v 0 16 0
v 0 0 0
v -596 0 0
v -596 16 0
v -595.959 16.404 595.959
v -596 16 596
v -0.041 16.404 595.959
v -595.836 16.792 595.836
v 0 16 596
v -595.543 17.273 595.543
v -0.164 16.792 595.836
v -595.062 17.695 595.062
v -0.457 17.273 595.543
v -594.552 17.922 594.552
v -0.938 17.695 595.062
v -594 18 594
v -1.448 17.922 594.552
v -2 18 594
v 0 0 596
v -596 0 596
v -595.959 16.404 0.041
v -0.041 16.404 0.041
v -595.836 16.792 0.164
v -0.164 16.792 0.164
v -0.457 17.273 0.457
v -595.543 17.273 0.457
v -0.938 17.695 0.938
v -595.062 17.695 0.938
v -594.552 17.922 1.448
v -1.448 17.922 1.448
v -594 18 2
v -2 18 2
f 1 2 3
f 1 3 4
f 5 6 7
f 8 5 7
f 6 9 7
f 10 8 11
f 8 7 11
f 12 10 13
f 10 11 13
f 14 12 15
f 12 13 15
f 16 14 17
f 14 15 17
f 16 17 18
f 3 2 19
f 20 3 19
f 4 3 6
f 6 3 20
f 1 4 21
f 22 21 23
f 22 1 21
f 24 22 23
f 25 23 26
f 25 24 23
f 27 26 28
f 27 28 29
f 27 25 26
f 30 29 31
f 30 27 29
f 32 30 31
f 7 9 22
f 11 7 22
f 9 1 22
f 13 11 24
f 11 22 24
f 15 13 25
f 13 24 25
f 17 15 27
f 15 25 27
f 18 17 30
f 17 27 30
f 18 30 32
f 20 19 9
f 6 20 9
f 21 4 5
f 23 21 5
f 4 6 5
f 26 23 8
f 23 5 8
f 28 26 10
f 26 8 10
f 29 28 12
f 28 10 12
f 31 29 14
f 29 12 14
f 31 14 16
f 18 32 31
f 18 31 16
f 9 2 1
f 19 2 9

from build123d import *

# Parameters (mm, degrees)
F0_W     = 60.9826296568
F0_H     = 42.9404079914
F1_DEPTH = 18
F2_DEPTH = 596
F3_DEPTH = 596
F4_R     = 2


with BuildPart() as f1:
    # F0 (on Front) → F1 (new body)
    with BuildSketch(Plane.XZ):
        with Locations((-30.4913148284, 21.4702039957)):
            Rectangle(F0_W, F0_H)
    extrude(amount=-F1_DEPTH)

    # F2 (add): a face of the model
    f2_faces = [f1.faces().sort_by_distance(p)[0] for p in [
        (0, 9, 21.4702039957),
    ]]
    extrude(f2_faces, amount=-F2_DEPTH)

    # F3 (add): a face of the model
    f3_faces = [f1.faces().sort_by_distance(p)[0] for p in [
        (-298, 9, 0),
    ]]
    extrude(f3_faces, amount=-F3_DEPTH)

    # F4
    f4_edges = [f1.edges().sort_by_distance(p)[0] for p in [
        (0, 18, 298),
        (-298, 18, 596),
        (-596, 18, 298),
        (-298, 18, 0),
    ]]
    fillet(f4_edges, radius=F4_R)


solid = f1.part
